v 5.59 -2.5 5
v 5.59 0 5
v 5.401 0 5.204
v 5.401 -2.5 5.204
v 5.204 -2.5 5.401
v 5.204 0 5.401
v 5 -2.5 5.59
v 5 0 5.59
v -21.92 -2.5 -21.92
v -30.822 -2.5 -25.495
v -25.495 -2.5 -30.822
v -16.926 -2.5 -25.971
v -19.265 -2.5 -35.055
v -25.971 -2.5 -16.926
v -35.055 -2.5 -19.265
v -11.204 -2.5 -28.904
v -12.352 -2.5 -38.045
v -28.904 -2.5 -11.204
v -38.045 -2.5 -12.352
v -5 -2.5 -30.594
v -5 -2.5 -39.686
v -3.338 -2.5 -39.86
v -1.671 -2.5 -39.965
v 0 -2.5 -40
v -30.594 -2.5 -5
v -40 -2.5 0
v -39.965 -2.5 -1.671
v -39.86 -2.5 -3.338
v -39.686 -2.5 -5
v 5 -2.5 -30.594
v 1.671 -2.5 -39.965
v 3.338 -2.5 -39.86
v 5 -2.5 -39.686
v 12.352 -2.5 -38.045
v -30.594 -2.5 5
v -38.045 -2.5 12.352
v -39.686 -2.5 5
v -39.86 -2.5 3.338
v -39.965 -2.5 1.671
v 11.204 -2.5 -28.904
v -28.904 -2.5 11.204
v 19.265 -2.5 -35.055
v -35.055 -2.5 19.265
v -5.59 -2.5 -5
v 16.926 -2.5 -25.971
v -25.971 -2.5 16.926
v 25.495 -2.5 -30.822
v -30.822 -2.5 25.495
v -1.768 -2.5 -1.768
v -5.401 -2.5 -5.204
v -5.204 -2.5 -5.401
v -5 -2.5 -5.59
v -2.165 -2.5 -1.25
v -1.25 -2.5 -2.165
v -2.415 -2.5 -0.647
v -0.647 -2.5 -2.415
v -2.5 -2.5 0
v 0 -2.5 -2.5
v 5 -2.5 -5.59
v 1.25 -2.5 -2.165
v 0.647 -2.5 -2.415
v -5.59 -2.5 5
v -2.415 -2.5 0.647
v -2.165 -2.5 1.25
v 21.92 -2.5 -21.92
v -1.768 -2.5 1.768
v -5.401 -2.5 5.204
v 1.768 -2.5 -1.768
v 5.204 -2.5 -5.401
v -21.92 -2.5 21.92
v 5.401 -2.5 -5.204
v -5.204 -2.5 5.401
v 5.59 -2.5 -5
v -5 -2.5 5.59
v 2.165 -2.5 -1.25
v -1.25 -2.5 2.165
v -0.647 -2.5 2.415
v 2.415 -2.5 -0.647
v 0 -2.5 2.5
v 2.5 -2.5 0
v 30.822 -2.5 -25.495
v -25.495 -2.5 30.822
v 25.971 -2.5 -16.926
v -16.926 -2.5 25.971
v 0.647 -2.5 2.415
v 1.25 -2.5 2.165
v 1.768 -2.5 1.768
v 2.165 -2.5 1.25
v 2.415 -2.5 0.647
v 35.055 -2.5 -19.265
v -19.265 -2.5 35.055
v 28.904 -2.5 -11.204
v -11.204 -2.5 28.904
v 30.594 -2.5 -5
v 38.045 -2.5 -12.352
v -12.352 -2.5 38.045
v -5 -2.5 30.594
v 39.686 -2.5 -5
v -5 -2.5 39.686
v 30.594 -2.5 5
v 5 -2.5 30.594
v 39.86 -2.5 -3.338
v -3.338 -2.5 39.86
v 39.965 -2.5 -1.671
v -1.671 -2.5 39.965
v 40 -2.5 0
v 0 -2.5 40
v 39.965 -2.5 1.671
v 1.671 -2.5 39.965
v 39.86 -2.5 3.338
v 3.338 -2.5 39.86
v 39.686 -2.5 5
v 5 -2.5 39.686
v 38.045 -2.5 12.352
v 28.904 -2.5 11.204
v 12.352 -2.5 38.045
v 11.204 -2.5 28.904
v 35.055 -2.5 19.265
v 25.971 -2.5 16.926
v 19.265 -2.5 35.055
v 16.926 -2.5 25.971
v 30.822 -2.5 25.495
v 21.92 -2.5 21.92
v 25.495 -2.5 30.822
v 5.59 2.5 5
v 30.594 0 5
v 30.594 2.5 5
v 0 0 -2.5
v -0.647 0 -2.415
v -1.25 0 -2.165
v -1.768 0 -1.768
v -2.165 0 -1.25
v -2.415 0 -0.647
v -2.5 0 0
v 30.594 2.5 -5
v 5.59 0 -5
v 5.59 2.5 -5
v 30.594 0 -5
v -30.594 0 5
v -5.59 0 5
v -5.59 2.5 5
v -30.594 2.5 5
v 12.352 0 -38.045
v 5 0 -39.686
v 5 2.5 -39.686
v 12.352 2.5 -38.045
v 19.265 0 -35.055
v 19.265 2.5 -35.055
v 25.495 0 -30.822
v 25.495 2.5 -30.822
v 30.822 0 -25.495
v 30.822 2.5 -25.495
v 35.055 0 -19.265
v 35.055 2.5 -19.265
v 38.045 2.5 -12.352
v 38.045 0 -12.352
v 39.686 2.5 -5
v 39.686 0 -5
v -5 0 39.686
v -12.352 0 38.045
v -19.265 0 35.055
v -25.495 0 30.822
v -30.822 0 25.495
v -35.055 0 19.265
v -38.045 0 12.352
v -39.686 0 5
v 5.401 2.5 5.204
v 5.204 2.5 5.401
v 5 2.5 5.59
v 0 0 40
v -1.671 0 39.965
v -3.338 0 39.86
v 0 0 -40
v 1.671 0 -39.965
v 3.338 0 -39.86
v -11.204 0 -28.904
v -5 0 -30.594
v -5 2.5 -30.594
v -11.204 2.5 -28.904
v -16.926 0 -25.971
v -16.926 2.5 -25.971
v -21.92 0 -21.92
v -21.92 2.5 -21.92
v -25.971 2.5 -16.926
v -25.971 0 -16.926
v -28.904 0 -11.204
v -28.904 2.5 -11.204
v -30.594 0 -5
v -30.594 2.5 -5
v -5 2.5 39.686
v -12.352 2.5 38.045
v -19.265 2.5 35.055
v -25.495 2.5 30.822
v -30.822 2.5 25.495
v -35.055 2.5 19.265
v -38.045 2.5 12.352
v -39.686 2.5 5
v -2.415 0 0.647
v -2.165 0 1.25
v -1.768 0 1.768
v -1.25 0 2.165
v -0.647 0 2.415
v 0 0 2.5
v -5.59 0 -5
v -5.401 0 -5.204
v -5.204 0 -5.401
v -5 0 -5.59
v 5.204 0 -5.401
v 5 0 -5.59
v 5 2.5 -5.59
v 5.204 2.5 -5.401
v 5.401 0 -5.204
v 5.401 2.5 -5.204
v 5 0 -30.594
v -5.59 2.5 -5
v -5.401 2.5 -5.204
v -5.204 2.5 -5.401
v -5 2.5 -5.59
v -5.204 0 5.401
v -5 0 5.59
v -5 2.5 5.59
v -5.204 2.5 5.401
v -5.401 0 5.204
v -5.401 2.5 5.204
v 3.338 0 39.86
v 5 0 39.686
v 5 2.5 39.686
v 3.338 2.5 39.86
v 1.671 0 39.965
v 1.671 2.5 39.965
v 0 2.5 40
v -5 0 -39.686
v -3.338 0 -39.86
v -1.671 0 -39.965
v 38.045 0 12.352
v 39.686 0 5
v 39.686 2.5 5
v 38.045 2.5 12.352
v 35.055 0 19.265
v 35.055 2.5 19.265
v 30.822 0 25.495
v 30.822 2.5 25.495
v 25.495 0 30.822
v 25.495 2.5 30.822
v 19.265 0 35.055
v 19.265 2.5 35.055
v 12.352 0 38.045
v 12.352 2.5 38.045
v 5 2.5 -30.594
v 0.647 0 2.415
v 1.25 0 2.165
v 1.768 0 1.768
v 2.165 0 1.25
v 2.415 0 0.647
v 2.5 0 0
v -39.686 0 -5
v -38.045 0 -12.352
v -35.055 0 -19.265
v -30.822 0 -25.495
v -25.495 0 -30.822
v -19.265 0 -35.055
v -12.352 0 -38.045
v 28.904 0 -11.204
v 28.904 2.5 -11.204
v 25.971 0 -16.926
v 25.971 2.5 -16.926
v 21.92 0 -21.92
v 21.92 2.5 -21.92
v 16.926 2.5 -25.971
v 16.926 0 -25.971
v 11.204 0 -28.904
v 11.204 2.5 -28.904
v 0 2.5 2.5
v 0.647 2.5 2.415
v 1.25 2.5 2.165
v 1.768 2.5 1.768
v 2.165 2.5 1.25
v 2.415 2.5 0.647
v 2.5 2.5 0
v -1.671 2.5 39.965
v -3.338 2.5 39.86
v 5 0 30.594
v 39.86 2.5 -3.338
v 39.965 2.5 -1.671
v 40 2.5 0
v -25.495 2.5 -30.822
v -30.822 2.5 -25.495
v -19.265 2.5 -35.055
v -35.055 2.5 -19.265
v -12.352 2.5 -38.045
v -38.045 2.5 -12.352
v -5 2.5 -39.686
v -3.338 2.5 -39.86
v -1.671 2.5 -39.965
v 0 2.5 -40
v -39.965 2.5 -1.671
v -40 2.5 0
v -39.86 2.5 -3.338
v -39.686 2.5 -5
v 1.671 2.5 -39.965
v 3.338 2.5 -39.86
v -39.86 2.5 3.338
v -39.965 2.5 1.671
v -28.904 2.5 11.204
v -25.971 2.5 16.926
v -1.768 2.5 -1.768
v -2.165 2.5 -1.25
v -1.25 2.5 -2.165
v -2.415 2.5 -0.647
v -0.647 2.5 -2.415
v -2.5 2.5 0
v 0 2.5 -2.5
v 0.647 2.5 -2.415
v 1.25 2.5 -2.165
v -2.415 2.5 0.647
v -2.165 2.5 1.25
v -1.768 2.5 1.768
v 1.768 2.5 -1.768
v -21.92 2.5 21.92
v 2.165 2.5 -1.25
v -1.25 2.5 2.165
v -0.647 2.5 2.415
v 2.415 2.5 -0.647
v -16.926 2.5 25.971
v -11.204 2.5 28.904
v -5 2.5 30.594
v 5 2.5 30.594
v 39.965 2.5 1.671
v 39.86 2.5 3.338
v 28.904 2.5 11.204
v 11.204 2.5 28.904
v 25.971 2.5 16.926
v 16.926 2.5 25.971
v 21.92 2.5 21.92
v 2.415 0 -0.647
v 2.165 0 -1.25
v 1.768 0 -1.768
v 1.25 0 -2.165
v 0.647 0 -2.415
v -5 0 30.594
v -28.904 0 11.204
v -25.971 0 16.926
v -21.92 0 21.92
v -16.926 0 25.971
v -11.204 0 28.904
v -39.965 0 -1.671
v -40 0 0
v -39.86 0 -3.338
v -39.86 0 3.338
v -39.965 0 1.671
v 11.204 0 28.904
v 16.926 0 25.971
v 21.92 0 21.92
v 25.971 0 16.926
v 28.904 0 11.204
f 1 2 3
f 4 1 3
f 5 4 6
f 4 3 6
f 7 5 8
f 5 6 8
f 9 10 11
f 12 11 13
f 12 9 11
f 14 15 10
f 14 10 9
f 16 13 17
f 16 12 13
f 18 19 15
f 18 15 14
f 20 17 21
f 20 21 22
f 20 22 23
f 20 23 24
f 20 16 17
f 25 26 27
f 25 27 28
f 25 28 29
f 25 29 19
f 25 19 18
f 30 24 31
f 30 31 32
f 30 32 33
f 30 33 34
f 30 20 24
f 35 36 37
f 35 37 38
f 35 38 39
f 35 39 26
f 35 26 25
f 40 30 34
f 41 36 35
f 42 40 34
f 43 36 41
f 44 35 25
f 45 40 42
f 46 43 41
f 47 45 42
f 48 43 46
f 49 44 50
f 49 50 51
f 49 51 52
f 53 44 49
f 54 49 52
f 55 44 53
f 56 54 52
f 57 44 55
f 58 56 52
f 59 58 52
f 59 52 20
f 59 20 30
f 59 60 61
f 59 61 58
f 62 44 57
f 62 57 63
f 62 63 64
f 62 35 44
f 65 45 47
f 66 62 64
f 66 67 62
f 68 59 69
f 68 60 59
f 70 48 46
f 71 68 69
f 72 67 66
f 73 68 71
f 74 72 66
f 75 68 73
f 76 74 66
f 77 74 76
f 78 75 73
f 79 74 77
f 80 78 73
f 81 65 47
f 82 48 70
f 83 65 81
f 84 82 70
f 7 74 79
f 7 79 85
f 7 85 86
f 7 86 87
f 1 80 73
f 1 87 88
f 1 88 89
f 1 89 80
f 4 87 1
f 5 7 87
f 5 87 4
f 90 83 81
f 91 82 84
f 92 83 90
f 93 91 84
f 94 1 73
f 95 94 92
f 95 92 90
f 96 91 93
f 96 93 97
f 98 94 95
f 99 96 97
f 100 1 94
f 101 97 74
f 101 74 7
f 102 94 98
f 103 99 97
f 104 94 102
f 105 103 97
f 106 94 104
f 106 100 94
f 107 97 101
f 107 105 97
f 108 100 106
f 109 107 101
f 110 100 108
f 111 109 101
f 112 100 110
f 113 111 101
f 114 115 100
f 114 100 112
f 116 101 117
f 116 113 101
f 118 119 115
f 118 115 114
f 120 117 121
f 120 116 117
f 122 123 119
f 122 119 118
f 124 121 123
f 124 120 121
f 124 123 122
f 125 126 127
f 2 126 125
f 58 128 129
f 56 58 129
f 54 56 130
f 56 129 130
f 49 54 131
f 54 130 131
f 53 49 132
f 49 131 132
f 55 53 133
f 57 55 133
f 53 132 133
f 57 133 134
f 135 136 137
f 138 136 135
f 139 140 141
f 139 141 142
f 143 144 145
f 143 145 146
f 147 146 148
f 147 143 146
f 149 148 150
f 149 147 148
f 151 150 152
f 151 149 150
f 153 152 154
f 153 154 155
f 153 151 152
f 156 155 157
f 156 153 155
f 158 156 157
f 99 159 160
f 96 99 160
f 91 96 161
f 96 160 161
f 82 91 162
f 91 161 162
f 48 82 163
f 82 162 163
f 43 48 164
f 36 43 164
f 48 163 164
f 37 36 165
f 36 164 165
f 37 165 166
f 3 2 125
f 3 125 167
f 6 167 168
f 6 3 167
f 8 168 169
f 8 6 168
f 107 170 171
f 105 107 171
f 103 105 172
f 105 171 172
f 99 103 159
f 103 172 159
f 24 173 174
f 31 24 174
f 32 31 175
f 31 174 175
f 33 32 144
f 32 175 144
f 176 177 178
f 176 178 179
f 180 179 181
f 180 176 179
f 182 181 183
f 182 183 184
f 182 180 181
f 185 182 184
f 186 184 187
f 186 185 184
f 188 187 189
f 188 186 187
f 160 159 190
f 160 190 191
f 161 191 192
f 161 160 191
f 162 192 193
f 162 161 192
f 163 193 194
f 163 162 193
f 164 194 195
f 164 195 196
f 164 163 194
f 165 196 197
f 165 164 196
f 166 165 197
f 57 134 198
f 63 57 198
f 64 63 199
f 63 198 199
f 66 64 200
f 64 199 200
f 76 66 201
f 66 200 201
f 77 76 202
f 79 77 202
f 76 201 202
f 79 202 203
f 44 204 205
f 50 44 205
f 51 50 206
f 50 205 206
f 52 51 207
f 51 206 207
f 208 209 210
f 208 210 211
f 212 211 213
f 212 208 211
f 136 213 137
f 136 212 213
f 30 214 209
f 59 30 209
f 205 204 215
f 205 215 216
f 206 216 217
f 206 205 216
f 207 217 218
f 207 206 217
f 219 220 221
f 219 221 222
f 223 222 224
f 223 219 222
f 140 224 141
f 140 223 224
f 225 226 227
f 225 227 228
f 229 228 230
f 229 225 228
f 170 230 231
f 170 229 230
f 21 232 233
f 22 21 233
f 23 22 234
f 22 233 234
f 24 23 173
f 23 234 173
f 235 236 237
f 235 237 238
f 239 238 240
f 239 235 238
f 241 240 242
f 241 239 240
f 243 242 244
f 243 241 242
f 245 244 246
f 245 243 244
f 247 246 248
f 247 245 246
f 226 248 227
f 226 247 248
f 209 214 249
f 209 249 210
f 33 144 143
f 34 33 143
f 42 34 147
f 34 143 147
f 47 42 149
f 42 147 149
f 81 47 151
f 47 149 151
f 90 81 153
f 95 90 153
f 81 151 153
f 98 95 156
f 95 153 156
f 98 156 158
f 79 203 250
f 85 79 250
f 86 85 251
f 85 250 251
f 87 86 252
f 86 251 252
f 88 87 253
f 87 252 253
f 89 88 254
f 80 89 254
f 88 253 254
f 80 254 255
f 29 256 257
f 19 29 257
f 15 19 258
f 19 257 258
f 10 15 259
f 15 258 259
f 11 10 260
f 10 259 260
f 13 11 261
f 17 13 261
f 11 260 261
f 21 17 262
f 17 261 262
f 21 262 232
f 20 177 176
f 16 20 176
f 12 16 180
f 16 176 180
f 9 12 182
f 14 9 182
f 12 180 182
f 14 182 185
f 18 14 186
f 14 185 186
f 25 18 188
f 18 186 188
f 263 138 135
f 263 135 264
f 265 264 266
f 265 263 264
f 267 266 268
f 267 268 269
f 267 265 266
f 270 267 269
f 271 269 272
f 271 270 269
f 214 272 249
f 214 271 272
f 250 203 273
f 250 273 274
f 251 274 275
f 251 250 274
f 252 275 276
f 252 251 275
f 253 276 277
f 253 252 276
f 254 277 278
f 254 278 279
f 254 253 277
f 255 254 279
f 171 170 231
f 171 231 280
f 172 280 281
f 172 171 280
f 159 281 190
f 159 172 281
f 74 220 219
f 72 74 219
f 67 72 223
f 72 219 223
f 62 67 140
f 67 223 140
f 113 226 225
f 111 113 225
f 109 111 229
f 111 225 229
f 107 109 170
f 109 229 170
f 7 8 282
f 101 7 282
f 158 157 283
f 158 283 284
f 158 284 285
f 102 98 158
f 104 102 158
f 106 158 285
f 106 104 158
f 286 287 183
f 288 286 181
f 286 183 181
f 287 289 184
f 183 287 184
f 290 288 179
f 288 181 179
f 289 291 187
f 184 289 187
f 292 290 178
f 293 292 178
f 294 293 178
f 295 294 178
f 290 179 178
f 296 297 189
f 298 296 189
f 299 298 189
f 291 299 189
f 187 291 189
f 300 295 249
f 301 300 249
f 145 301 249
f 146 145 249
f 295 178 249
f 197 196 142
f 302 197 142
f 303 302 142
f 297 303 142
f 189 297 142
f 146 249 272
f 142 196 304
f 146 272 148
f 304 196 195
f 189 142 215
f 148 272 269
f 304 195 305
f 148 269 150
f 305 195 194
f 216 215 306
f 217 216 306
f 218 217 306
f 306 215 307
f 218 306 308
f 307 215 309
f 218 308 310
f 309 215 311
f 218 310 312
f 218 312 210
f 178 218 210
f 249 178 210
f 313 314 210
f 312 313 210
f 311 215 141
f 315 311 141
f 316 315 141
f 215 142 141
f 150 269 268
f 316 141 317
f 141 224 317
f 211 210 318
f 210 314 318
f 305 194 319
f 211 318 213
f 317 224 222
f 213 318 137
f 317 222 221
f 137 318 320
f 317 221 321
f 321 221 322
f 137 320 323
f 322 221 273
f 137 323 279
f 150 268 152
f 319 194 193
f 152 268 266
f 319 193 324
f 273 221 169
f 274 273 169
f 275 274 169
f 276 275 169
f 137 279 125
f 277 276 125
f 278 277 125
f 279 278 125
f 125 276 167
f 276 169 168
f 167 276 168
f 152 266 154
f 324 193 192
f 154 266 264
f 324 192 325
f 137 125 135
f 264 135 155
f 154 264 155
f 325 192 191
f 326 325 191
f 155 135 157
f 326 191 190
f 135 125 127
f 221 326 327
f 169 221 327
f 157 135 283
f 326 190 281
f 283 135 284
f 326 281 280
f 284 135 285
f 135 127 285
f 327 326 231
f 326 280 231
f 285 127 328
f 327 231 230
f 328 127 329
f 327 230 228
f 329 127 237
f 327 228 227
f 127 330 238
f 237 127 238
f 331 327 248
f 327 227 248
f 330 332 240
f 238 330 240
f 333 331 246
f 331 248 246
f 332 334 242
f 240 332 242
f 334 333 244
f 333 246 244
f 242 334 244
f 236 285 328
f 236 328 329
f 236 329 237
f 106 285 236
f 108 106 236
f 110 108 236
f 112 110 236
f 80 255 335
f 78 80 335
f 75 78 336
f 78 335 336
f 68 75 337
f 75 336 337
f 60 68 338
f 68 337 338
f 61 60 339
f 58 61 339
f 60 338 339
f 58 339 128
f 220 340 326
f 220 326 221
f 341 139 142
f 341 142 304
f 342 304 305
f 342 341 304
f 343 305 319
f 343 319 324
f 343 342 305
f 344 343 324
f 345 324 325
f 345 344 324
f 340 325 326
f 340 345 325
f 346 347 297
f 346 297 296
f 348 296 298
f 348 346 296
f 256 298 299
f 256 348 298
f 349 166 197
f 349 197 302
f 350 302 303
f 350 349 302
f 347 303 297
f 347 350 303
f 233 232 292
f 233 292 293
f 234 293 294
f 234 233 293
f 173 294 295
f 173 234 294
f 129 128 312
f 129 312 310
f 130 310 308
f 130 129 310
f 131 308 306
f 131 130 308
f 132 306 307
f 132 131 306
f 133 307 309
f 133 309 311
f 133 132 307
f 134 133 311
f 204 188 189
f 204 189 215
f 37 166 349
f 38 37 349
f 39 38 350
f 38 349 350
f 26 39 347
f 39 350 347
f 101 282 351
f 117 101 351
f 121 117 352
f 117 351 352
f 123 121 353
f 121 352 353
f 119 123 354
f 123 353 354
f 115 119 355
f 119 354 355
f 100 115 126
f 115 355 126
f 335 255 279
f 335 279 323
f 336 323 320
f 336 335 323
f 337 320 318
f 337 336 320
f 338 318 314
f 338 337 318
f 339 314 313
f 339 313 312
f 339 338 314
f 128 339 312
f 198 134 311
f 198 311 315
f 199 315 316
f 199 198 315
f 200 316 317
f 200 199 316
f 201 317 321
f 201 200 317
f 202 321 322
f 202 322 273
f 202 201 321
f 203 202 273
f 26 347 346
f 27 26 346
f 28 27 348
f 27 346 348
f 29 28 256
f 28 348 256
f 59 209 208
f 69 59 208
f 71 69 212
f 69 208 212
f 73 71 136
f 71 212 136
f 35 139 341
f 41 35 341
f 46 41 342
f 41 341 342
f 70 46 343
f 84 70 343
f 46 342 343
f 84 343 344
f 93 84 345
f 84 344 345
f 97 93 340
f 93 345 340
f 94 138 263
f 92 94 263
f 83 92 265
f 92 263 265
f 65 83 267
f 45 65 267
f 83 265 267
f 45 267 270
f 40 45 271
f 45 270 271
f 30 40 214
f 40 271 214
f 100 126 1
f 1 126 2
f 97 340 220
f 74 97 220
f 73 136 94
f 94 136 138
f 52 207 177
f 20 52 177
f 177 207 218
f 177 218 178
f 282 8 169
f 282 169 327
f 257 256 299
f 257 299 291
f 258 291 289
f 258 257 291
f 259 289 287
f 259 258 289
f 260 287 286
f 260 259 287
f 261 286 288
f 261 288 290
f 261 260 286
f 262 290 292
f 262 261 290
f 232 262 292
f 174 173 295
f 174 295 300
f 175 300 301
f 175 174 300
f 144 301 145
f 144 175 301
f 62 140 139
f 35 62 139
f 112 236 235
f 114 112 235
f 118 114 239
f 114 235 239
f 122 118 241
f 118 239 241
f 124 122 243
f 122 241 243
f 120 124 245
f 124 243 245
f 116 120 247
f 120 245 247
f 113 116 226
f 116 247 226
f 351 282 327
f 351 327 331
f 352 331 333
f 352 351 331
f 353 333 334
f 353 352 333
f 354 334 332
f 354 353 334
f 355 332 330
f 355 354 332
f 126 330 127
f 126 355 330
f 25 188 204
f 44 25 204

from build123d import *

# Parameters (mm, degrees)
F1_DEPTH = 2.5


with BuildPart() as f1:
    # F0 (on Front) → F1 (new body, symmetric)
    with BuildSketch(Plane.XZ):
        with BuildLine():
            Line((31, 0), (40, 0))
            ThreePointArc((40, 0), (39.921490373, 2.5049164455), (39.68626968, 4.9999998882))
            Line((39.68626968, 4.9999998882), (30.5941170998, 4.9999998882))
            ThreePointArc((30.5941170998, 4.9999998882), (30.8983626596, 2.5082234655), (31, 0))
        make_face()
        with BuildLine():
            ThreePointArc((39.686269666, -5), (39.9214903695, -2.5049165017), (40, 0))
            Line((40, 0), (31, 0))
            ThreePointArc((31, 0), (30.8983626551, -2.5082235219), (30.5941170816, -5))
            Line((30.5941170816, -5), (39.686269666, -5))
        make_face()
        with BuildLine():
            Line((30.5941170998, 4.9999998882), (39.68626968, 4.9999998882))
            ThreePointArc((39.68626968, 4.9999998882), (28.2842712674, 28.2842712275), (4.9999999441, 39.686269673))
            Line((4.9999998882, 39.686269673), (4.9999998882, 30.5941170907))
            ThreePointArc((4.9999999441, 30.5941170907), (21.9203102368, 21.9203101968), (30.5941170998, 4.9999998882))
        make_face()
        with BuildLine():
            ThreePointArc((4.9999998882, -39.68626968), (28.2842712076, -28.2842712873), (39.686269666, -5))
            Line((39.686269666, -5), (30.5941170816, -5))
            ThreePointArc((30.5941170816, -5), (21.9203101767, -21.9203102568), (4.9999998882, -30.5941170998))
            Line((4.9999998882, -30.5941170998), (4.9999998882, -39.68626968))
        make_face()
        with BuildLine():
            Line((4.9999998882, 30.5941170907), (4.9999998882, 39.686269673))
            ThreePointArc((4.9999999441, 39.686269673), (2.5049164736, 39.9214903712), (0, 40))
            Line((0, 40), (0, 31))
            ThreePointArc((0, 31), (2.5082234937, 30.8983626574), (4.9999999441, 30.5941170907))
        make_face()
        with BuildLine():
            ThreePointArc((0, -40), (2.5049164455, -39.921490373), (4.9999998882, -39.68626968))
            Line((4.9999998882, -39.68626968), (4.9999998882, -30.5941170998))
            ThreePointArc((4.9999998882, -30.5941170998), (2.5082234655, -30.8983626596), (0, -31))
            Line((0, -31), (0, -40))
        make_face()
        with BuildLine():
            Line((0, 31), (0, 40))
            ThreePointArc((0, 40), (-2.5049164455, 39.921490373), (-4.9999998882, 39.68626968))
            Line((-4.9999998882, 39.68626968), (-4.9999998882, 30.5941170998))
            ThreePointArc((-4.9999998882, 30.5941170998), (-2.5082234655, 30.8983626596), (0, 31))
        make_face()
        with BuildLine():
            ThreePointArc((-5, -39.686269666), (-2.5049165017, -39.9214903695), (0, -40))
            Line((0, -40), (0, -31))
            ThreePointArc((0, -31), (-2.5082235219, -30.8983626551), (-5, -30.5941170816))
            Line((-5, -30.5941170816), (-5, -39.686269666))
        make_face()
        with BuildLine():
            Line((-4.9999998882, 30.5941170998), (-4.9999998882, 39.68626968))
            ThreePointArc((-4.9999998882, 39.68626968), (-28.2842712076, 28.2842712873), (-39.686269666, 5))
            Line((-39.686269666, 5), (-30.5941170816, 5))
            ThreePointArc((-30.5941170816, 5), (-21.9203101767, 21.9203102568), (-4.9999998882, 30.5941170998))
        make_face()
        with BuildLine():
            ThreePointArc((-39.68626968, -4.9999998882), (-28.2842712873, -28.2842712076), (-5, -39.686269666))
            Line((-5, -39.686269666), (-5, -30.5941170816))
            ThreePointArc((-5, -30.5941170816), (-21.9203102568, -21.9203101767), (-30.5941170998, -4.9999998882))
            Line((-30.5941170998, -4.9999998882), (-39.68626968, -4.9999998882))
        make_face()
        with BuildLine():
            Line((-30.5941170816, 5), (-39.686269666, 5))
            ThreePointArc((-39.686269666, 5), (-39.9214903695, 2.5049165017), (-40, 0))
            Line((-40, 0), (-31, 0))
            ThreePointArc((-31, 0), (-30.8983626551, 2.5082235219), (-30.5941170816, 5))
        make_face()
        with BuildLine():
            ThreePointArc((-40, 0), (-39.921490373, -2.5049164455), (-39.68626968, -4.9999998882))
            Line((-39.68626968, -4.9999998882), (-30.5941170998, -4.9999998882))
            ThreePointArc((-30.5941170998, -4.9999998882), (-30.8983626596, -2.5082234655), (-31, 0))
            Line((-31, 0), (-40, 0))
        make_face()
        with BuildLine():
            Line((4.9999998882, 5.5901699937), (4.9999998882, 30.5941170907))
            ThreePointArc((4.9999999441, 30.5941170907), (2.5082234937, 30.8983626574), (0, 31))
            Line((0, 31), (0, 7.5))
            ThreePointArc((0, 7.5), (2.6761656383, 7.0062927056), (4.9999999441, 5.5901699937))
        make_face()
        with BuildLine():
            Line((0, 7.5), (0, 31))
            ThreePointArc((0, 31), (-2.5082234655, 30.8983626596), (-4.9999998882, 30.5941170998))
            Line((-4.9999998882, 30.5941170998), (-4.9999998882, 5.5901700437))
            ThreePointArc((-4.9999998882, 5.5901700437), (-2.6761656033, 7.006292719), (0, 7.5))
        make_face()
        with BuildLine():
            Line((-5.5901699437, 5), (-30.5941170816, 5))
            ThreePointArc((-30.5941170816, 5), (-30.8983626551, 2.5082235219), (-31, 0))
            Line((-31, 0), (-7.5, 0))
            ThreePointArc((-7.5, 0), (-7.0062926922, 2.6761656733), (-5.5901699437, 5))
        make_face()
        with BuildLine():
            ThreePointArc((-31, 0), (-30.8983626596, -2.5082234655), (-30.5941170998, -4.9999998882))
            Line((-30.5941170998, -4.9999998882), (-5.5901700437, -4.9999998882))
            ThreePointArc((-5.5901700437, -4.9999998882), (-7.006292719, -2.6761656033), (-7.5, 0))
            Line((-7.5, 0), (-31, 0))
        make_face()
        with BuildLine():
            ThreePointArc((-5, -30.5941170816), (-2.5082235219, -30.8983626551), (0, -31))
            Line((0, -31), (0, -7.5))
            ThreePointArc((0, -7.5), (-2.6761656733, -7.0062926922), (-5, -5.5901699437))
            Line((-5, -5.5901699437), (-5, -30.5941170816))
        make_face()
        with BuildLine():
            ThreePointArc((0, -31), (2.5082234655, -30.8983626596), (4.9999998882, -30.5941170998))
            Line((4.9999998882, -30.5941170998), (4.9999998882, -5.5901700437))
            ThreePointArc((4.9999998882, -5.5901700437), (2.6761656033, -7.006292719), (0, -7.5))
            Line((0, -7.5), (0, -31))
        make_face()
        with BuildLine():
            ThreePointArc((30.5941170816, -5), (30.8983626551, -2.5082235219), (31, 0))
            Line((31, 0), (7.5, 0))
            ThreePointArc((7.5, 0), (7.0062926922, -2.6761656733), (5.5901699437, -5))
            Line((5.5901699437, -5), (30.5941170816, -5))
        make_face()
        with BuildLine():
            Line((7.5, 0), (31, 0))
            ThreePointArc((31, 0), (30.8983626596, 2.5082234655), (30.5941170998, 4.9999998882))
            Line((30.5941170998, 4.9999998882), (5.5901700437, 4.9999998882))
            ThreePointArc((5.5901700437, 4.9999998882), (7.006292719, 2.6761656033), (7.5, 0))
        make_face()
        with BuildLine():
            Line((4.9999999255, 0), (7.5, 0))
            ThreePointArc((7.5, 0), (7.006292719, 2.6761656033), (5.5901700437, 4.9999998882))
            Line((5.5901700437, 4.9999998882), (4.9999999441, 4.9999998882))
            Line((4.9999998882, 4.9999998882), (4.9999998882, 0))
        make_face()
        with BuildLine():
            Line((2.5, 0), (4.9999999255, 0))
            Line((4.9999998882, 0), (4.9999998882, 4.9999998882))
            Line((4.9999999441, 4.9999998882), (0, 4.9999998882))
            Line((0, 4.9999999441), (0, 2.5))
            ThreePointArc((0, 2.5), (1.767766953, 1.767766953), (2.5, 0))
        make_face()
        with BuildLine():
            Line((4.9999998882, 4.9999998882), (4.9999998882, 5.5901699937))
            ThreePointArc((4.9999999441, 5.5901699937), (2.6761656383, 7.0062927056), (0, 7.5))
            Line((0, 7.5), (0, 4.9999999441))
            Line((0, 4.9999998882), (4.9999999441, 4.9999998882))
        make_face()
        with BuildLine():
            Line((0, 4.9999999441), (0, 7.5))
            ThreePointArc((0, 7.5), (-2.6761656033, 7.006292719), (-4.9999998882, 5.5901700437))
            Line((-4.9999998882, 5.5901700437), (-4.9999998882, 5))
            Line((-4.9999998882, 5), (0, 5))
        make_face()
        with BuildLine():
            Line((0, 2.5), (0, 4.9999999441))
            Line((0, 5), (-4.9999998882, 5))
            Line((-4.9999998882, 5), (-4.9999998882, 0))
            Line((-4.9999999441, 0), (-2.5, 0))
            ThreePointArc((-2.5, 0), (-1.767766953, 1.767766953), (0, 2.5))
        make_face()
        with BuildLine():
            Line((-4.9999998882, 0), (-4.9999998882, 5))
            Line((-4.9999998882, 5), (-5.5901699437, 5))
            ThreePointArc((-5.5901699437, 5), (-7.0062926922, 2.6761656733), (-7.5, 0))
            Line((-7.5, 0), (-4.9999999441, 0))
        make_face()
        with BuildLine():
            Line((-5.5901700437, -4.9999998882), (-5, -4.9999998882))
            Line((-5, -4.9999998882), (-5, 0))
            Line((-4.9999999441, 0), (-7.5, 0))
            ThreePointArc((-7.5, 0), (-7.006292719, -2.6761656033), (-5.5901700437, -4.9999998882))
        make_face()
        with BuildLine():
            Line((-5, -4.9999998882), (0, -4.9999998882))
            Line((0, -4.9999999441), (0, -2.5))
            ThreePointArc((0, -2.5), (-1.767766953, -1.767766953), (-2.5, 0))
            Line((-2.5, 0), (-4.9999999441, 0))
            Line((-5, 0), (-5, -4.9999998882))
        make_face()
        with BuildLine():
            Line((4.9999998882, -5), (4.9999998882, 0))
            Line((4.9999999255, 0), (2.5, 0))
            ThreePointArc((2.5, 0), (1.767766953, -1.767766953), (0, -2.5))
            Line((0, -2.5), (0, -4.9999999441))
            Line((0, -5), (4.9999998882, -5))
        make_face()
        with BuildLine():
            ThreePointArc((5.5901699437, -5), (7.0062926922, -2.6761656733), (7.5, 0))
            Line((7.5, 0), (4.9999999255, 0))
            Line((4.9999998882, 0), (4.9999998882, -5))
            Line((4.9999998882, -5), (5.5901699437, -5))
        make_face()
        with BuildLine():
            ThreePointArc((0, -7.5), (2.6761656033, -7.006292719), (4.9999998882, -5.5901700437))
            Line((4.9999998882, -5.5901700437), (4.9999998882, -5))
            Line((4.9999998882, -5), (0, -5))
            Line((0, -4.9999999441), (0, -7.5))
        make_face()
        with BuildLine():
            Line((-4.9999998882, 5), (-4.9999998882, 5.5901700437))
            ThreePointArc((-4.9999998882, 5.5901700437), (-5.3033008059, 5.3033009119), (-5.5901699437, 5))
            Line((-5.5901699437, 5), (-4.9999998882, 5))
        make_face()
        with BuildLine():
            ThreePointArc((-5.5901700437, -4.9999998882), (-5.3033009119, -5.3033008059), (-5, -5.5901699437))
            Line((-5, -5.5901699437), (-5, -4.9999998882))
            Line((-5, -4.9999998882), (-5.5901700437, -4.9999998882))
        make_face()
        with BuildLine():
            ThreePointArc((-5, -5.5901699437), (-2.6761656733, -7.0062926922), (0, -7.5))
            Line((0, -7.5), (0, -4.9999999441))
            Line((0, -4.9999998882), (-5, -4.9999998882))
            Line((-5, -4.9999998882), (-5, -5.5901699437))
        make_face()
        with BuildLine():
            ThreePointArc((4.9999998882, -5.5901700437), (5.3033008059, -5.3033009119), (5.5901699437, -5))
            Line((5.5901699437, -5), (4.9999998882, -5))
            Line((4.9999998882, -5), (4.9999998882, -5.5901700437))
        make_face()
        with BuildLine():
            Line((4.9999999441, 4.9999998882), (5.5901700437, 4.9999998882))
            ThreePointArc((5.5901700437, 4.9999998882), (5.3033008854, 5.3033008324), (4.9999999441, 5.5901699937))
            Line((4.9999998882, 5.5901699937), (4.9999998882, 4.9999998882))
        make_face()
    extrude(amount=F1_DEPTH, both=True)


solid = f1.part
